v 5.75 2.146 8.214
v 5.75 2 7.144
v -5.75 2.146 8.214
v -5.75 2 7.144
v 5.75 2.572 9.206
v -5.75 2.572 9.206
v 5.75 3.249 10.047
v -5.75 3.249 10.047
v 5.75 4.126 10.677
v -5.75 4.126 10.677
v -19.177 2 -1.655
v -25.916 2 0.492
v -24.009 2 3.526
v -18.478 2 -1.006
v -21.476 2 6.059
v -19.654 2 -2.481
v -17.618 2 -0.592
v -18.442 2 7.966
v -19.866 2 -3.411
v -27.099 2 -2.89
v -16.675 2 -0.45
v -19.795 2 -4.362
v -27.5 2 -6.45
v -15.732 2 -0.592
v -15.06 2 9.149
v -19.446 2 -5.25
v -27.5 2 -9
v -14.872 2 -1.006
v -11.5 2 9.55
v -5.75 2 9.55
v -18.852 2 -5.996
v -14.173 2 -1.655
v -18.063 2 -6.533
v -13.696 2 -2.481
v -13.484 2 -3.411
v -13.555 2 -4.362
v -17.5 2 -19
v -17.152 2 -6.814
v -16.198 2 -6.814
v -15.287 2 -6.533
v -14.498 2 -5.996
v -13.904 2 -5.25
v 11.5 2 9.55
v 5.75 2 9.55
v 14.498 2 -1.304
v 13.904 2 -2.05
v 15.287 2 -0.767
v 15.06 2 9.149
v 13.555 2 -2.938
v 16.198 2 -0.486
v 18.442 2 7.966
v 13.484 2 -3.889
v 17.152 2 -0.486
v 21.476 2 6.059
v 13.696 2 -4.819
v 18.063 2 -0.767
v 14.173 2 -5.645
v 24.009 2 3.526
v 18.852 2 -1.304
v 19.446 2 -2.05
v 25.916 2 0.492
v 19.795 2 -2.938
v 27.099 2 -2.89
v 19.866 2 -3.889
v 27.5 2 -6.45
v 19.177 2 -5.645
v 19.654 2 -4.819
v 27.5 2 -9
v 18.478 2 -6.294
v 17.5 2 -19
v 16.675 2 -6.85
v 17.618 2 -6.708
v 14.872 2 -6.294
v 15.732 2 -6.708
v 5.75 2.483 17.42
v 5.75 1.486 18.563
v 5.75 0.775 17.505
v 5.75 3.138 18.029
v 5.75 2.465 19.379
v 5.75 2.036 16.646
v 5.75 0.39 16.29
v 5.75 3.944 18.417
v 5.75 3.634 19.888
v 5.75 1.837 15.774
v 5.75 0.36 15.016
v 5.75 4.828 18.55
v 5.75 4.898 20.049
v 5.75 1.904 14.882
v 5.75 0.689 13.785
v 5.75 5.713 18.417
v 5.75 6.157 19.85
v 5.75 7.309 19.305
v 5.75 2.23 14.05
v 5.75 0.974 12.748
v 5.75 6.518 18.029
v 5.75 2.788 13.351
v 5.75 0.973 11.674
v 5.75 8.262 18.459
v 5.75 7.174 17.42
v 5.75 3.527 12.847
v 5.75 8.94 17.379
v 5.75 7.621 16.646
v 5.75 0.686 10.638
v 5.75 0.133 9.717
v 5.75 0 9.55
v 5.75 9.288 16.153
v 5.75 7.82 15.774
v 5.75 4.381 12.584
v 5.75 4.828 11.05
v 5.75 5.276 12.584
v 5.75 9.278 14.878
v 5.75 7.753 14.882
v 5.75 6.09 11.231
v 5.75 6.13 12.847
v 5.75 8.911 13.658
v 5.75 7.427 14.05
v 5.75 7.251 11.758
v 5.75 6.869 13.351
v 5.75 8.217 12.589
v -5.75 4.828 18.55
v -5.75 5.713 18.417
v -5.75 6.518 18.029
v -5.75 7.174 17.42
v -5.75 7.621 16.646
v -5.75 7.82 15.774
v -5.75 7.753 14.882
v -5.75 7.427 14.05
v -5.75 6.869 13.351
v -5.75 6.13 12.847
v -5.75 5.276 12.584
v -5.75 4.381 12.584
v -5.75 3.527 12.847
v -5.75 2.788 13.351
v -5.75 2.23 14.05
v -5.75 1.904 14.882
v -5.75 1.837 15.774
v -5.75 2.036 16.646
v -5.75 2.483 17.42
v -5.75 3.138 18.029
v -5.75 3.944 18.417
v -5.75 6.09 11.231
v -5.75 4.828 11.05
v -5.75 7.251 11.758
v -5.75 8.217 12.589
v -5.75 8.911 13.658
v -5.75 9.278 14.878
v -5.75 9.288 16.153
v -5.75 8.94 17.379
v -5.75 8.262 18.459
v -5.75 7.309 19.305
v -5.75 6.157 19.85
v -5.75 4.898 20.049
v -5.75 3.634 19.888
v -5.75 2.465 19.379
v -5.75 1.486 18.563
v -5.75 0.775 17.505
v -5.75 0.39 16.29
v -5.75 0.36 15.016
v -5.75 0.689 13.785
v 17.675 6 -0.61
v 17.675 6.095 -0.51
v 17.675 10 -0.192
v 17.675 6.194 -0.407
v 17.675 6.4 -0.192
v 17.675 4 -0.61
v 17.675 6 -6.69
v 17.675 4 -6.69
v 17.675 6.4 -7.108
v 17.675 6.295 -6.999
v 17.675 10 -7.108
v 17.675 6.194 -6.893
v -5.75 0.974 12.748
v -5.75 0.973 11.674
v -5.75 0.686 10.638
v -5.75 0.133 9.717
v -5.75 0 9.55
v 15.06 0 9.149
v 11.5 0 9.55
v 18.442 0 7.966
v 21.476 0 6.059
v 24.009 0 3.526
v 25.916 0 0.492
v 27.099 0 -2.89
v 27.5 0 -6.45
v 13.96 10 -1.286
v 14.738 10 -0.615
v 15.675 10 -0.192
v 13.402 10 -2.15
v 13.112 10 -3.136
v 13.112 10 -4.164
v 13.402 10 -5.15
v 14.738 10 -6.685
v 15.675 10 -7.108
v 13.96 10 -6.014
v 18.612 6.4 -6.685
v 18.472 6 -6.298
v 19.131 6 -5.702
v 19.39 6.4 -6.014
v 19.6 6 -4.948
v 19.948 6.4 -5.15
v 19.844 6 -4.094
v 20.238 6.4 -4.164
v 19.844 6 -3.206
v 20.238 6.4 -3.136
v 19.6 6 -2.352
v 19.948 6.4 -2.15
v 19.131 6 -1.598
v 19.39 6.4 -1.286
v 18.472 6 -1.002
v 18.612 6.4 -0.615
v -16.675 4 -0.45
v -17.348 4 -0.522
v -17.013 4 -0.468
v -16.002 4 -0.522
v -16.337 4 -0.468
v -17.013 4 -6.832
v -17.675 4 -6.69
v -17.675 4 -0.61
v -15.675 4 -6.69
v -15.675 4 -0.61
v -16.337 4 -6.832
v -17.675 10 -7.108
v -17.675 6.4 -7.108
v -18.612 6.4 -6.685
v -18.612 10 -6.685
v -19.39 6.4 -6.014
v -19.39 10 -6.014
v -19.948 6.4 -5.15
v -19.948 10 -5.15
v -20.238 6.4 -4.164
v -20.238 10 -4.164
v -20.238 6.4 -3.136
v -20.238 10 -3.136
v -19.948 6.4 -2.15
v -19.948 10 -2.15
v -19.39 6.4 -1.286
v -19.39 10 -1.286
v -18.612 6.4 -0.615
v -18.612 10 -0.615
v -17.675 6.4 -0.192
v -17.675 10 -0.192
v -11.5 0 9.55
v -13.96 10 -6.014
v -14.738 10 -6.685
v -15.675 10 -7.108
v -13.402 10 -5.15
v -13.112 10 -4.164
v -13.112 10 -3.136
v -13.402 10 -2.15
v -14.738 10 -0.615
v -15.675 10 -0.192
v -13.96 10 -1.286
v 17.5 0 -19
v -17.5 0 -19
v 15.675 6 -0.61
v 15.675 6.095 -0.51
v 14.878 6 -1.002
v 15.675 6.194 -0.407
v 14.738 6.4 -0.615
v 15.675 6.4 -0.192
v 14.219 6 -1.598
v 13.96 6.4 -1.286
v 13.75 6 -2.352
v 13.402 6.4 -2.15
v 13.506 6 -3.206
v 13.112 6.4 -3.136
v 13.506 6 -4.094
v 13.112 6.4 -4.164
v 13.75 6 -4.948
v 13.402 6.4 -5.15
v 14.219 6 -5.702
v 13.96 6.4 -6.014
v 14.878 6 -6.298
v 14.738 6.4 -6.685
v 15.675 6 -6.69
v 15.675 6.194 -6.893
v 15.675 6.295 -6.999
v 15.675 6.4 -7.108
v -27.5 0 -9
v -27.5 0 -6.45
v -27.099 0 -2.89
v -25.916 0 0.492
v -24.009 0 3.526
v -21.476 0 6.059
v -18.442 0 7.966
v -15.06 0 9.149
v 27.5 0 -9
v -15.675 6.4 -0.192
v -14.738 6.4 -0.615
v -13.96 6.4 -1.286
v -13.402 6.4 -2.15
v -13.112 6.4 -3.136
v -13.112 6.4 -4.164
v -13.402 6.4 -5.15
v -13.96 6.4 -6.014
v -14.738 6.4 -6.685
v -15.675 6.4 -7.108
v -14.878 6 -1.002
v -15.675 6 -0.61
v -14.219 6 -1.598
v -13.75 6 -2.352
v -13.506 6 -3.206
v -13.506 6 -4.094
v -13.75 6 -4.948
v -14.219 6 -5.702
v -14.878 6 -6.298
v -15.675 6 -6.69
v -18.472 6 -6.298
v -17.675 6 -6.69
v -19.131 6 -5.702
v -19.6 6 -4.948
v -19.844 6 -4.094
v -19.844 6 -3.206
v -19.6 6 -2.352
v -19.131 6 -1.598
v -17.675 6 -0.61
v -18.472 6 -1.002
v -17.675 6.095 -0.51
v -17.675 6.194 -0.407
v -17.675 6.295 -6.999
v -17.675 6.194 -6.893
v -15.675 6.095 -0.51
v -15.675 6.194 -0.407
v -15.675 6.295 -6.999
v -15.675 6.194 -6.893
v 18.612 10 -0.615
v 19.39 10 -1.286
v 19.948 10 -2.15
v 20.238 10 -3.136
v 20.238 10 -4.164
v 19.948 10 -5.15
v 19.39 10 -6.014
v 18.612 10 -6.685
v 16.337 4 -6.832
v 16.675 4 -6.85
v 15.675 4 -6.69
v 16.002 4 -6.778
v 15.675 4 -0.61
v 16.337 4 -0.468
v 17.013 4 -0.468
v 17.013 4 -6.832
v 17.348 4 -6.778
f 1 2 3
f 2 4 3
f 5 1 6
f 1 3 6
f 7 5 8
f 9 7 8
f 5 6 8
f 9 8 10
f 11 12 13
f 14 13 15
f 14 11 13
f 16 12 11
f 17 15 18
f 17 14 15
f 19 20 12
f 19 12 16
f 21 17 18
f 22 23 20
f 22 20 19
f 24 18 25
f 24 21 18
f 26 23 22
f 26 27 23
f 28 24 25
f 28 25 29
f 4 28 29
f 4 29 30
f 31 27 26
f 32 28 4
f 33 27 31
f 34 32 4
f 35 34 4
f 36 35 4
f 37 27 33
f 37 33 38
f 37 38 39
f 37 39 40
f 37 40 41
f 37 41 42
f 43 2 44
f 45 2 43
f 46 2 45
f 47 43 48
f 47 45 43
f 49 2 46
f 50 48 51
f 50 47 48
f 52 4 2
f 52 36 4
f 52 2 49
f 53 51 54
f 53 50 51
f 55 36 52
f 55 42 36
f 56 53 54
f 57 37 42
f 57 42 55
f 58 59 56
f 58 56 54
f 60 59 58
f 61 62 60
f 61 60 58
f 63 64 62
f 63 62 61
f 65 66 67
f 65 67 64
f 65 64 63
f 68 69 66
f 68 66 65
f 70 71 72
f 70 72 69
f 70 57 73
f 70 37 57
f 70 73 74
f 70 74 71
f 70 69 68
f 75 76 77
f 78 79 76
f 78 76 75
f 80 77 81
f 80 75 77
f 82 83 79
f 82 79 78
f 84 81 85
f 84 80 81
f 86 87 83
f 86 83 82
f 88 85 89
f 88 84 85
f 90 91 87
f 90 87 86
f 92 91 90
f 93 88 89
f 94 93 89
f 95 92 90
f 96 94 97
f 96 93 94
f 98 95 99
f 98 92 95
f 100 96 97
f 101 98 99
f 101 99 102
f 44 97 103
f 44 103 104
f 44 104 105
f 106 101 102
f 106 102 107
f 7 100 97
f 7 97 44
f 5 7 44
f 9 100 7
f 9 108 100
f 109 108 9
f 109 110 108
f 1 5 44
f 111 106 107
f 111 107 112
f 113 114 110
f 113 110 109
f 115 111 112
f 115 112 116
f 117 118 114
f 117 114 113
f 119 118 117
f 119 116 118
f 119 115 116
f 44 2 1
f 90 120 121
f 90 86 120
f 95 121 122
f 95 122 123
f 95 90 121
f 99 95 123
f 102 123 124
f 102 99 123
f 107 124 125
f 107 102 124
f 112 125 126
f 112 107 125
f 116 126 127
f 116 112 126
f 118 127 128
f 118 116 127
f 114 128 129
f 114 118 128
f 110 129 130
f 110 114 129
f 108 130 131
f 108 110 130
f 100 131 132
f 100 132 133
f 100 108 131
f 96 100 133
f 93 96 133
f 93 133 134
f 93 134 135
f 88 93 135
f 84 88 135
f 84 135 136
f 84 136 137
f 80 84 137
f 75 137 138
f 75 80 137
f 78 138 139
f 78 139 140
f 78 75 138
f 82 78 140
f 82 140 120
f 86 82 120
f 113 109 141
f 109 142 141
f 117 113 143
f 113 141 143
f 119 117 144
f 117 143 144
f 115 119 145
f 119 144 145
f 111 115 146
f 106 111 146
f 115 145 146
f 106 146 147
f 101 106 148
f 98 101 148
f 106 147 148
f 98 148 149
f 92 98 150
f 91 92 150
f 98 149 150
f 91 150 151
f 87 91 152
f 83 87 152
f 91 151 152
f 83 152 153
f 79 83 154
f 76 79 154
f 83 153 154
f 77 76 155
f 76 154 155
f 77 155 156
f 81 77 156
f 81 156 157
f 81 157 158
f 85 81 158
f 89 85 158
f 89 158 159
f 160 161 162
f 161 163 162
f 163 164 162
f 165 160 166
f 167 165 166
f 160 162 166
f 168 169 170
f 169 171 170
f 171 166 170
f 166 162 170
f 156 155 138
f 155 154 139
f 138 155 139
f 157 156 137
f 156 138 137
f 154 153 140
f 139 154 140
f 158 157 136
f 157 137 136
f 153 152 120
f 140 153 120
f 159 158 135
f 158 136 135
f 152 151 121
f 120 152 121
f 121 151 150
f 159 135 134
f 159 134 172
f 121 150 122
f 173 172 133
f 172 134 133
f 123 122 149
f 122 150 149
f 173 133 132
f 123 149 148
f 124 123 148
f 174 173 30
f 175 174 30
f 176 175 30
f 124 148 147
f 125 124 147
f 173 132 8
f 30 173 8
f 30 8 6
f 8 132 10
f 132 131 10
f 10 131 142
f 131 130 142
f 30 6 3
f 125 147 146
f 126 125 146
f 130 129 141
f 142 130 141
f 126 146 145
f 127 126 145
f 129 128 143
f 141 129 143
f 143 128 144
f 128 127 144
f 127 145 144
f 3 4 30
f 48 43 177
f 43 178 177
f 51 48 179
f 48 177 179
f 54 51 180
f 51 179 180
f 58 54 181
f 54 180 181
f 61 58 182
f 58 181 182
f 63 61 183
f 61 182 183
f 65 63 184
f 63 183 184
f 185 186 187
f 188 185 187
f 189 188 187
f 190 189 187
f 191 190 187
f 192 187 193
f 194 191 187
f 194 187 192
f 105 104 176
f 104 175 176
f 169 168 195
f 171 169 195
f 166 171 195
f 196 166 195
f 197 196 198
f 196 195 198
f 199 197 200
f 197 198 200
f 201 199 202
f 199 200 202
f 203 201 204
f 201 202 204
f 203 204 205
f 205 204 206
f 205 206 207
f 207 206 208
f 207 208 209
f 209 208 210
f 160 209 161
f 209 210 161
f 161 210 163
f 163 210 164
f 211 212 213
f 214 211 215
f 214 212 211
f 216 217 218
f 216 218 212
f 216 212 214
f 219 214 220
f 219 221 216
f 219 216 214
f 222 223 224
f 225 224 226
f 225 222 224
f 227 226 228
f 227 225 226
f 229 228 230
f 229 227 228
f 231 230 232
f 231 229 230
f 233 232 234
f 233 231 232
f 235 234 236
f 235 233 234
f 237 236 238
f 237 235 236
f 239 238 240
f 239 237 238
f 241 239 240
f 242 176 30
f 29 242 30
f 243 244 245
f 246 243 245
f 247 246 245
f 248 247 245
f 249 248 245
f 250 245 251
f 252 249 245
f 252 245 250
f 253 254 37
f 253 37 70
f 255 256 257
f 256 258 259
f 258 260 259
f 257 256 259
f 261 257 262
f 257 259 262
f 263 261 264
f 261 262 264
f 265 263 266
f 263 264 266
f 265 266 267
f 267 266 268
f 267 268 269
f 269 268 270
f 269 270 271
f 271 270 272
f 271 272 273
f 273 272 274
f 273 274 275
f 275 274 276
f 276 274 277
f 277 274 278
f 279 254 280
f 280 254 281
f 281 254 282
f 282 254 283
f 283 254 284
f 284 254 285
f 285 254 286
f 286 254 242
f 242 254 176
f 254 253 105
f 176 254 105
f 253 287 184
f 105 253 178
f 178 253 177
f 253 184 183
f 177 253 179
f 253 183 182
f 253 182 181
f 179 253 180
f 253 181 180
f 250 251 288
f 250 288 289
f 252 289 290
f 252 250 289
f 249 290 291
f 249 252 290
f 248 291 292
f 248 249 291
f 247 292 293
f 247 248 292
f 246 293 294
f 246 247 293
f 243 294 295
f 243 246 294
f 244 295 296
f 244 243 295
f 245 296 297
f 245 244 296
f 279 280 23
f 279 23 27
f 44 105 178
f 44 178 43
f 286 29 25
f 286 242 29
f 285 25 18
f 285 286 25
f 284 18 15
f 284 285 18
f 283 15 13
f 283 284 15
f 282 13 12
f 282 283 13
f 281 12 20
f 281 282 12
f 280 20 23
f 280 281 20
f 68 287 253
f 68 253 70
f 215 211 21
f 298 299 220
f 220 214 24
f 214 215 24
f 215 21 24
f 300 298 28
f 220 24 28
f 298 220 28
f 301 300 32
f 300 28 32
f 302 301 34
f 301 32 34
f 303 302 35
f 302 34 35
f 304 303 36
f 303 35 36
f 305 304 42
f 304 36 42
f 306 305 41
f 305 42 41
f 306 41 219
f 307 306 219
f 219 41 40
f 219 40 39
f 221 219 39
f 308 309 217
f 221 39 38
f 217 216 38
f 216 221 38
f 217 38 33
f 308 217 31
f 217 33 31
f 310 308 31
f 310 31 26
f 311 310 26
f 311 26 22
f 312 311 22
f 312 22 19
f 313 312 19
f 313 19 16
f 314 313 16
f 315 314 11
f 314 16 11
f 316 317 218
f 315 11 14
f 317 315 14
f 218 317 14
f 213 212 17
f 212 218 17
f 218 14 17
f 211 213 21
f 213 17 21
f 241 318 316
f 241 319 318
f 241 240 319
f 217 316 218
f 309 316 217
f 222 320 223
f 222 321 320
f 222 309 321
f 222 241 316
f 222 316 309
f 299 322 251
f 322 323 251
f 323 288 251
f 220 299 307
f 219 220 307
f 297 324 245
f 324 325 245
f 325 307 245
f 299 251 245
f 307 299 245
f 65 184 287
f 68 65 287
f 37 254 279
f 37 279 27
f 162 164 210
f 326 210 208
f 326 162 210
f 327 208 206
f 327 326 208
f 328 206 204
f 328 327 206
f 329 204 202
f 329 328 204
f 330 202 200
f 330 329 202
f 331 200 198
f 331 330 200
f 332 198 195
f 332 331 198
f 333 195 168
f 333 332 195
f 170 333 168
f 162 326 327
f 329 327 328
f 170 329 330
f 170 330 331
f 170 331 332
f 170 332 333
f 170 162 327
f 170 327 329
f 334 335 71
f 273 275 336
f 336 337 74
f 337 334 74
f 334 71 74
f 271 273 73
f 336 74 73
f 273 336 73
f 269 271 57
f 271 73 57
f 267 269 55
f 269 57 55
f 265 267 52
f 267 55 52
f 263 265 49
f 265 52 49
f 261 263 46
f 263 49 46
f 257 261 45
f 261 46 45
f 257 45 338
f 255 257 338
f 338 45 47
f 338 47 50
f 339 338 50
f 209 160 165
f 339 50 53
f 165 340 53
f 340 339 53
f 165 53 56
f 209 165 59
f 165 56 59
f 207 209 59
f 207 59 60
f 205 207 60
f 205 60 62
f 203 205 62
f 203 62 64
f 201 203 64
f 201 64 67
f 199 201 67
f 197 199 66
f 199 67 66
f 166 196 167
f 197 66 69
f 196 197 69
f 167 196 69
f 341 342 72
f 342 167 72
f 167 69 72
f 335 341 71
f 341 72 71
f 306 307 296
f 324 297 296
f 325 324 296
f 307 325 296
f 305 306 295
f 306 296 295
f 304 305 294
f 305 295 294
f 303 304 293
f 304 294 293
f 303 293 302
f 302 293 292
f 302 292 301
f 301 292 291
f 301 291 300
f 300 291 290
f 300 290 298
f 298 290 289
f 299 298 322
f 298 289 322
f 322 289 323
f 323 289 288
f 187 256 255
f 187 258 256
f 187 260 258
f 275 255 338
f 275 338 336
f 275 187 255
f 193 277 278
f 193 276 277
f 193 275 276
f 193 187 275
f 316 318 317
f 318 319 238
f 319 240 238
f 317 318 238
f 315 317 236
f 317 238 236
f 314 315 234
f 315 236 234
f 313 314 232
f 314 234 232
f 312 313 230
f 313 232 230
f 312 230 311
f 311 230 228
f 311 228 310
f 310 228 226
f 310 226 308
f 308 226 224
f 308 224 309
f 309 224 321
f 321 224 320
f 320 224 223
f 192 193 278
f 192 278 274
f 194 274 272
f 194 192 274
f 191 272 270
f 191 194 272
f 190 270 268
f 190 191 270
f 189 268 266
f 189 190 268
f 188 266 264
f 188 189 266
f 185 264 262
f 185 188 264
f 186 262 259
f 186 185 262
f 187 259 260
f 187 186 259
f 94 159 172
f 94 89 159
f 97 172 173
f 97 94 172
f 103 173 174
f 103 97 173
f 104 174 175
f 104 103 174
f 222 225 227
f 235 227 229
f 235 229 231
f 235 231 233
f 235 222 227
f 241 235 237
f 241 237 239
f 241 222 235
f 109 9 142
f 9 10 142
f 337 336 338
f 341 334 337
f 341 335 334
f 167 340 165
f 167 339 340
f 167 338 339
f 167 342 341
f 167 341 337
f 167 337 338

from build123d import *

# Parameters (mm, degrees)
SKETCH2_W               = 55
SKETCH2_H               = 38
BOSS_EXTRUDE1_DEPTH     = 2
SKETCH3_R               = 3.2
BOSS_EXTRUDE2_DEPTH     = 10
SKETCH4_R               = 3.6
BOSS_EXTRUDE3_DEPTH     = 1
CHAMFER1_SIZE           = 3
SKETCH5_W               = 2
SKETCH5_H               = 10.684354826
CUT_EXTRUDE1_DEPTH      = 6
CHAMFER2_SIZE           = 10
CUT_EXTRUDE2_DEPTH      = 35.889110049
CUT_EXTRUDE2_DEPTH_BACK = 35.889110049
SKETCH8_W               = 9.45
SKETCH8_H               = 2
SKETCH9_R               = 3
BOSS_EXTRUDE4_DEPTH     = 5.75
FILLET1_R               = 4
FILLET2_R               = 16


with BuildPart() as part:
    # Sketch2 → Boss-Extrude1 (new body)
    with BuildSketch(Plane(origin=(0, 0, 0), x_dir=(1, 0, 0), z_dir=(0, 1, 0))):
        Rectangle(SKETCH2_W, SKETCH2_H)
    extrude(amount=BOSS_EXTRUDE1_DEPTH)

    # Sketch3 → Boss-Extrude2 (add)
    with BuildSketch(Plane(origin=(0, 0, 0), x_dir=(1, 0, 0), z_dir=(0, 1, 0))):
        with Locations(Location((-16.675, 3.65, 0), (0, 0, 270))):
            Circle(SKETCH3_R)
        with Locations(Location((16.675, 3.65, 0), (0, 0, 90))):
            Circle(SKETCH3_R)
    extrude(amount=BOSS_EXTRUDE2_DEPTH)

    # Sketch4 → Boss-Extrude3 (add)
    with BuildSketch(Plane(origin=(0, 10, 0), x_dir=(1, 0, 0), z_dir=(0, 1, 0))):
        with Locations(Location((-16.675, 3.65, 0), (0, 0, 270))):
            Circle(SKETCH4_R)
        with Locations(Location((16.675, 3.65, 0), (0, 0, 90))):
            Circle(SKETCH4_R)
    extrude(amount=-BOSS_EXTRUDE3_DEPTH)

    # Chamfer1
    # the kernel refuses this chamfer: 3 mm, written as the material it adds along each edge
    with BuildSketch(Plane(origin=(16.675, 9, -3.65), x_dir=(0, 0, -1), z_dir=(-1, 0, 0))) as chamfer1_piece_1_section:
        Polygon((3.2, CHAMFER1_SIZE), (3.2 + CHAMFER1_SIZE, 0), (3.2, 0), align=None)
    chamfer1_piece_1 = revolve(axis=Axis((16.675, 9, -3.65), (0, -1, 0)), mode=Mode.PRIVATE)
    chamfer1_piece_1 = chamfer1_piece_1 & Plane(origin=(16.675, 6.179265151, -3.65), x_dir=(0, 0, -1), z_dir=(0, 1, 0)) * Cylinder(3.6, 25, mode=Mode.PRIVATE)
    add(chamfer1_piece_1)
    with BuildSketch(Plane(origin=(-16.675, 9, -3.65), x_dir=(0, 0, 1), z_dir=(1, 0, 0))) as chamfer1_piece_2_section:
        Polygon((3.2, CHAMFER1_SIZE), (3.2 + CHAMFER1_SIZE, 0), (3.2, 0), align=None)
    chamfer1_piece_2 = revolve(axis=Axis((-16.675, 9, -3.65), (0, -1, 0)), mode=Mode.PRIVATE)
    chamfer1_piece_2 = chamfer1_piece_2 & Plane(origin=(-16.675, 6.179265151, -3.65), x_dir=(0, 0, 1), z_dir=(0, 1, 0)) * Cylinder(3.6, 25, mode=Mode.PRIVATE)
    add(chamfer1_piece_2)

    # Sketch5 → Cut-Extrude1 (cut)
    with BuildSketch(Plane(origin=(0, 10, 0), x_dir=(1, 0, 0), z_dir=(0, 1, 0))):
        with Locations((16.675, 3.65)):
            Rectangle(SKETCH5_W, SKETCH5_H)
        with Locations((-16.675, 3.65)):
            Rectangle(SKETCH5_W, SKETCH5_H)
    extrude(amount=-CUT_EXTRUDE1_DEPTH, mode=Mode.SUBTRACT)

    # Chamfer2
    chamfer2_edges = [part.edges().sort_by_distance(p)[0] for p in [
        (-27.5, 1, -19),
        (27.5, 1, -19),
    ]]
    chamfer(chamfer2_edges, length=CHAMFER2_SIZE)

    # Sketch8 → Cut-Extrude2 (cut, two sides: drawn at the far end of the back side and taken through both)
    with BuildSketch(Plane.ZY.offset(-CUT_EXTRUDE2_DEPTH_BACK)):
        with Locations((14.275, 1)):
            Rectangle(SKETCH8_W, SKETCH8_H)
    extrude(amount=CUT_EXTRUDE2_DEPTH + CUT_EXTRUDE2_DEPTH_BACK, mode=Mode.SUBTRACT)

    # Sketch9 → Boss-Extrude4 (add, symmetric)
    with BuildSketch(Plane.ZY):
        with BuildLine():
            Line((9.55, 2), (11.05, 4.828427125))
            ThreePointArc((11.05, 4.828427125), (19.792640687, 6.328427125), (12.05, 2))
            Line((12.05, 2), (9.55, 0))
            Line((9.55, 0), (9.55, 2))
        make_face()
        with Locations((15.55, 4.828427125)):
            Circle(SKETCH9_R, mode=Mode.SUBTRACT)
    extrude(amount=BOSS_EXTRUDE4_DEPTH, both=True)

    # Fillet1
    fillet1_edges = [part.edges().sort_by_distance(p)[0] for p in [
        (0, 2, 9.55),
        (0, 2, 12.05),
    ]]
    fillet(fillet1_edges, radius=FILLET1_R)

    # Fillet2
    fillet2_edges = [part.edges().sort_by_distance(p)[0] for p in [
        (27.5, 1, 9.55),
        (-27.5, 1, 9.55),
    ]]
    fillet(fillet2_edges, radius=FILLET2_R)


solid = part.part
